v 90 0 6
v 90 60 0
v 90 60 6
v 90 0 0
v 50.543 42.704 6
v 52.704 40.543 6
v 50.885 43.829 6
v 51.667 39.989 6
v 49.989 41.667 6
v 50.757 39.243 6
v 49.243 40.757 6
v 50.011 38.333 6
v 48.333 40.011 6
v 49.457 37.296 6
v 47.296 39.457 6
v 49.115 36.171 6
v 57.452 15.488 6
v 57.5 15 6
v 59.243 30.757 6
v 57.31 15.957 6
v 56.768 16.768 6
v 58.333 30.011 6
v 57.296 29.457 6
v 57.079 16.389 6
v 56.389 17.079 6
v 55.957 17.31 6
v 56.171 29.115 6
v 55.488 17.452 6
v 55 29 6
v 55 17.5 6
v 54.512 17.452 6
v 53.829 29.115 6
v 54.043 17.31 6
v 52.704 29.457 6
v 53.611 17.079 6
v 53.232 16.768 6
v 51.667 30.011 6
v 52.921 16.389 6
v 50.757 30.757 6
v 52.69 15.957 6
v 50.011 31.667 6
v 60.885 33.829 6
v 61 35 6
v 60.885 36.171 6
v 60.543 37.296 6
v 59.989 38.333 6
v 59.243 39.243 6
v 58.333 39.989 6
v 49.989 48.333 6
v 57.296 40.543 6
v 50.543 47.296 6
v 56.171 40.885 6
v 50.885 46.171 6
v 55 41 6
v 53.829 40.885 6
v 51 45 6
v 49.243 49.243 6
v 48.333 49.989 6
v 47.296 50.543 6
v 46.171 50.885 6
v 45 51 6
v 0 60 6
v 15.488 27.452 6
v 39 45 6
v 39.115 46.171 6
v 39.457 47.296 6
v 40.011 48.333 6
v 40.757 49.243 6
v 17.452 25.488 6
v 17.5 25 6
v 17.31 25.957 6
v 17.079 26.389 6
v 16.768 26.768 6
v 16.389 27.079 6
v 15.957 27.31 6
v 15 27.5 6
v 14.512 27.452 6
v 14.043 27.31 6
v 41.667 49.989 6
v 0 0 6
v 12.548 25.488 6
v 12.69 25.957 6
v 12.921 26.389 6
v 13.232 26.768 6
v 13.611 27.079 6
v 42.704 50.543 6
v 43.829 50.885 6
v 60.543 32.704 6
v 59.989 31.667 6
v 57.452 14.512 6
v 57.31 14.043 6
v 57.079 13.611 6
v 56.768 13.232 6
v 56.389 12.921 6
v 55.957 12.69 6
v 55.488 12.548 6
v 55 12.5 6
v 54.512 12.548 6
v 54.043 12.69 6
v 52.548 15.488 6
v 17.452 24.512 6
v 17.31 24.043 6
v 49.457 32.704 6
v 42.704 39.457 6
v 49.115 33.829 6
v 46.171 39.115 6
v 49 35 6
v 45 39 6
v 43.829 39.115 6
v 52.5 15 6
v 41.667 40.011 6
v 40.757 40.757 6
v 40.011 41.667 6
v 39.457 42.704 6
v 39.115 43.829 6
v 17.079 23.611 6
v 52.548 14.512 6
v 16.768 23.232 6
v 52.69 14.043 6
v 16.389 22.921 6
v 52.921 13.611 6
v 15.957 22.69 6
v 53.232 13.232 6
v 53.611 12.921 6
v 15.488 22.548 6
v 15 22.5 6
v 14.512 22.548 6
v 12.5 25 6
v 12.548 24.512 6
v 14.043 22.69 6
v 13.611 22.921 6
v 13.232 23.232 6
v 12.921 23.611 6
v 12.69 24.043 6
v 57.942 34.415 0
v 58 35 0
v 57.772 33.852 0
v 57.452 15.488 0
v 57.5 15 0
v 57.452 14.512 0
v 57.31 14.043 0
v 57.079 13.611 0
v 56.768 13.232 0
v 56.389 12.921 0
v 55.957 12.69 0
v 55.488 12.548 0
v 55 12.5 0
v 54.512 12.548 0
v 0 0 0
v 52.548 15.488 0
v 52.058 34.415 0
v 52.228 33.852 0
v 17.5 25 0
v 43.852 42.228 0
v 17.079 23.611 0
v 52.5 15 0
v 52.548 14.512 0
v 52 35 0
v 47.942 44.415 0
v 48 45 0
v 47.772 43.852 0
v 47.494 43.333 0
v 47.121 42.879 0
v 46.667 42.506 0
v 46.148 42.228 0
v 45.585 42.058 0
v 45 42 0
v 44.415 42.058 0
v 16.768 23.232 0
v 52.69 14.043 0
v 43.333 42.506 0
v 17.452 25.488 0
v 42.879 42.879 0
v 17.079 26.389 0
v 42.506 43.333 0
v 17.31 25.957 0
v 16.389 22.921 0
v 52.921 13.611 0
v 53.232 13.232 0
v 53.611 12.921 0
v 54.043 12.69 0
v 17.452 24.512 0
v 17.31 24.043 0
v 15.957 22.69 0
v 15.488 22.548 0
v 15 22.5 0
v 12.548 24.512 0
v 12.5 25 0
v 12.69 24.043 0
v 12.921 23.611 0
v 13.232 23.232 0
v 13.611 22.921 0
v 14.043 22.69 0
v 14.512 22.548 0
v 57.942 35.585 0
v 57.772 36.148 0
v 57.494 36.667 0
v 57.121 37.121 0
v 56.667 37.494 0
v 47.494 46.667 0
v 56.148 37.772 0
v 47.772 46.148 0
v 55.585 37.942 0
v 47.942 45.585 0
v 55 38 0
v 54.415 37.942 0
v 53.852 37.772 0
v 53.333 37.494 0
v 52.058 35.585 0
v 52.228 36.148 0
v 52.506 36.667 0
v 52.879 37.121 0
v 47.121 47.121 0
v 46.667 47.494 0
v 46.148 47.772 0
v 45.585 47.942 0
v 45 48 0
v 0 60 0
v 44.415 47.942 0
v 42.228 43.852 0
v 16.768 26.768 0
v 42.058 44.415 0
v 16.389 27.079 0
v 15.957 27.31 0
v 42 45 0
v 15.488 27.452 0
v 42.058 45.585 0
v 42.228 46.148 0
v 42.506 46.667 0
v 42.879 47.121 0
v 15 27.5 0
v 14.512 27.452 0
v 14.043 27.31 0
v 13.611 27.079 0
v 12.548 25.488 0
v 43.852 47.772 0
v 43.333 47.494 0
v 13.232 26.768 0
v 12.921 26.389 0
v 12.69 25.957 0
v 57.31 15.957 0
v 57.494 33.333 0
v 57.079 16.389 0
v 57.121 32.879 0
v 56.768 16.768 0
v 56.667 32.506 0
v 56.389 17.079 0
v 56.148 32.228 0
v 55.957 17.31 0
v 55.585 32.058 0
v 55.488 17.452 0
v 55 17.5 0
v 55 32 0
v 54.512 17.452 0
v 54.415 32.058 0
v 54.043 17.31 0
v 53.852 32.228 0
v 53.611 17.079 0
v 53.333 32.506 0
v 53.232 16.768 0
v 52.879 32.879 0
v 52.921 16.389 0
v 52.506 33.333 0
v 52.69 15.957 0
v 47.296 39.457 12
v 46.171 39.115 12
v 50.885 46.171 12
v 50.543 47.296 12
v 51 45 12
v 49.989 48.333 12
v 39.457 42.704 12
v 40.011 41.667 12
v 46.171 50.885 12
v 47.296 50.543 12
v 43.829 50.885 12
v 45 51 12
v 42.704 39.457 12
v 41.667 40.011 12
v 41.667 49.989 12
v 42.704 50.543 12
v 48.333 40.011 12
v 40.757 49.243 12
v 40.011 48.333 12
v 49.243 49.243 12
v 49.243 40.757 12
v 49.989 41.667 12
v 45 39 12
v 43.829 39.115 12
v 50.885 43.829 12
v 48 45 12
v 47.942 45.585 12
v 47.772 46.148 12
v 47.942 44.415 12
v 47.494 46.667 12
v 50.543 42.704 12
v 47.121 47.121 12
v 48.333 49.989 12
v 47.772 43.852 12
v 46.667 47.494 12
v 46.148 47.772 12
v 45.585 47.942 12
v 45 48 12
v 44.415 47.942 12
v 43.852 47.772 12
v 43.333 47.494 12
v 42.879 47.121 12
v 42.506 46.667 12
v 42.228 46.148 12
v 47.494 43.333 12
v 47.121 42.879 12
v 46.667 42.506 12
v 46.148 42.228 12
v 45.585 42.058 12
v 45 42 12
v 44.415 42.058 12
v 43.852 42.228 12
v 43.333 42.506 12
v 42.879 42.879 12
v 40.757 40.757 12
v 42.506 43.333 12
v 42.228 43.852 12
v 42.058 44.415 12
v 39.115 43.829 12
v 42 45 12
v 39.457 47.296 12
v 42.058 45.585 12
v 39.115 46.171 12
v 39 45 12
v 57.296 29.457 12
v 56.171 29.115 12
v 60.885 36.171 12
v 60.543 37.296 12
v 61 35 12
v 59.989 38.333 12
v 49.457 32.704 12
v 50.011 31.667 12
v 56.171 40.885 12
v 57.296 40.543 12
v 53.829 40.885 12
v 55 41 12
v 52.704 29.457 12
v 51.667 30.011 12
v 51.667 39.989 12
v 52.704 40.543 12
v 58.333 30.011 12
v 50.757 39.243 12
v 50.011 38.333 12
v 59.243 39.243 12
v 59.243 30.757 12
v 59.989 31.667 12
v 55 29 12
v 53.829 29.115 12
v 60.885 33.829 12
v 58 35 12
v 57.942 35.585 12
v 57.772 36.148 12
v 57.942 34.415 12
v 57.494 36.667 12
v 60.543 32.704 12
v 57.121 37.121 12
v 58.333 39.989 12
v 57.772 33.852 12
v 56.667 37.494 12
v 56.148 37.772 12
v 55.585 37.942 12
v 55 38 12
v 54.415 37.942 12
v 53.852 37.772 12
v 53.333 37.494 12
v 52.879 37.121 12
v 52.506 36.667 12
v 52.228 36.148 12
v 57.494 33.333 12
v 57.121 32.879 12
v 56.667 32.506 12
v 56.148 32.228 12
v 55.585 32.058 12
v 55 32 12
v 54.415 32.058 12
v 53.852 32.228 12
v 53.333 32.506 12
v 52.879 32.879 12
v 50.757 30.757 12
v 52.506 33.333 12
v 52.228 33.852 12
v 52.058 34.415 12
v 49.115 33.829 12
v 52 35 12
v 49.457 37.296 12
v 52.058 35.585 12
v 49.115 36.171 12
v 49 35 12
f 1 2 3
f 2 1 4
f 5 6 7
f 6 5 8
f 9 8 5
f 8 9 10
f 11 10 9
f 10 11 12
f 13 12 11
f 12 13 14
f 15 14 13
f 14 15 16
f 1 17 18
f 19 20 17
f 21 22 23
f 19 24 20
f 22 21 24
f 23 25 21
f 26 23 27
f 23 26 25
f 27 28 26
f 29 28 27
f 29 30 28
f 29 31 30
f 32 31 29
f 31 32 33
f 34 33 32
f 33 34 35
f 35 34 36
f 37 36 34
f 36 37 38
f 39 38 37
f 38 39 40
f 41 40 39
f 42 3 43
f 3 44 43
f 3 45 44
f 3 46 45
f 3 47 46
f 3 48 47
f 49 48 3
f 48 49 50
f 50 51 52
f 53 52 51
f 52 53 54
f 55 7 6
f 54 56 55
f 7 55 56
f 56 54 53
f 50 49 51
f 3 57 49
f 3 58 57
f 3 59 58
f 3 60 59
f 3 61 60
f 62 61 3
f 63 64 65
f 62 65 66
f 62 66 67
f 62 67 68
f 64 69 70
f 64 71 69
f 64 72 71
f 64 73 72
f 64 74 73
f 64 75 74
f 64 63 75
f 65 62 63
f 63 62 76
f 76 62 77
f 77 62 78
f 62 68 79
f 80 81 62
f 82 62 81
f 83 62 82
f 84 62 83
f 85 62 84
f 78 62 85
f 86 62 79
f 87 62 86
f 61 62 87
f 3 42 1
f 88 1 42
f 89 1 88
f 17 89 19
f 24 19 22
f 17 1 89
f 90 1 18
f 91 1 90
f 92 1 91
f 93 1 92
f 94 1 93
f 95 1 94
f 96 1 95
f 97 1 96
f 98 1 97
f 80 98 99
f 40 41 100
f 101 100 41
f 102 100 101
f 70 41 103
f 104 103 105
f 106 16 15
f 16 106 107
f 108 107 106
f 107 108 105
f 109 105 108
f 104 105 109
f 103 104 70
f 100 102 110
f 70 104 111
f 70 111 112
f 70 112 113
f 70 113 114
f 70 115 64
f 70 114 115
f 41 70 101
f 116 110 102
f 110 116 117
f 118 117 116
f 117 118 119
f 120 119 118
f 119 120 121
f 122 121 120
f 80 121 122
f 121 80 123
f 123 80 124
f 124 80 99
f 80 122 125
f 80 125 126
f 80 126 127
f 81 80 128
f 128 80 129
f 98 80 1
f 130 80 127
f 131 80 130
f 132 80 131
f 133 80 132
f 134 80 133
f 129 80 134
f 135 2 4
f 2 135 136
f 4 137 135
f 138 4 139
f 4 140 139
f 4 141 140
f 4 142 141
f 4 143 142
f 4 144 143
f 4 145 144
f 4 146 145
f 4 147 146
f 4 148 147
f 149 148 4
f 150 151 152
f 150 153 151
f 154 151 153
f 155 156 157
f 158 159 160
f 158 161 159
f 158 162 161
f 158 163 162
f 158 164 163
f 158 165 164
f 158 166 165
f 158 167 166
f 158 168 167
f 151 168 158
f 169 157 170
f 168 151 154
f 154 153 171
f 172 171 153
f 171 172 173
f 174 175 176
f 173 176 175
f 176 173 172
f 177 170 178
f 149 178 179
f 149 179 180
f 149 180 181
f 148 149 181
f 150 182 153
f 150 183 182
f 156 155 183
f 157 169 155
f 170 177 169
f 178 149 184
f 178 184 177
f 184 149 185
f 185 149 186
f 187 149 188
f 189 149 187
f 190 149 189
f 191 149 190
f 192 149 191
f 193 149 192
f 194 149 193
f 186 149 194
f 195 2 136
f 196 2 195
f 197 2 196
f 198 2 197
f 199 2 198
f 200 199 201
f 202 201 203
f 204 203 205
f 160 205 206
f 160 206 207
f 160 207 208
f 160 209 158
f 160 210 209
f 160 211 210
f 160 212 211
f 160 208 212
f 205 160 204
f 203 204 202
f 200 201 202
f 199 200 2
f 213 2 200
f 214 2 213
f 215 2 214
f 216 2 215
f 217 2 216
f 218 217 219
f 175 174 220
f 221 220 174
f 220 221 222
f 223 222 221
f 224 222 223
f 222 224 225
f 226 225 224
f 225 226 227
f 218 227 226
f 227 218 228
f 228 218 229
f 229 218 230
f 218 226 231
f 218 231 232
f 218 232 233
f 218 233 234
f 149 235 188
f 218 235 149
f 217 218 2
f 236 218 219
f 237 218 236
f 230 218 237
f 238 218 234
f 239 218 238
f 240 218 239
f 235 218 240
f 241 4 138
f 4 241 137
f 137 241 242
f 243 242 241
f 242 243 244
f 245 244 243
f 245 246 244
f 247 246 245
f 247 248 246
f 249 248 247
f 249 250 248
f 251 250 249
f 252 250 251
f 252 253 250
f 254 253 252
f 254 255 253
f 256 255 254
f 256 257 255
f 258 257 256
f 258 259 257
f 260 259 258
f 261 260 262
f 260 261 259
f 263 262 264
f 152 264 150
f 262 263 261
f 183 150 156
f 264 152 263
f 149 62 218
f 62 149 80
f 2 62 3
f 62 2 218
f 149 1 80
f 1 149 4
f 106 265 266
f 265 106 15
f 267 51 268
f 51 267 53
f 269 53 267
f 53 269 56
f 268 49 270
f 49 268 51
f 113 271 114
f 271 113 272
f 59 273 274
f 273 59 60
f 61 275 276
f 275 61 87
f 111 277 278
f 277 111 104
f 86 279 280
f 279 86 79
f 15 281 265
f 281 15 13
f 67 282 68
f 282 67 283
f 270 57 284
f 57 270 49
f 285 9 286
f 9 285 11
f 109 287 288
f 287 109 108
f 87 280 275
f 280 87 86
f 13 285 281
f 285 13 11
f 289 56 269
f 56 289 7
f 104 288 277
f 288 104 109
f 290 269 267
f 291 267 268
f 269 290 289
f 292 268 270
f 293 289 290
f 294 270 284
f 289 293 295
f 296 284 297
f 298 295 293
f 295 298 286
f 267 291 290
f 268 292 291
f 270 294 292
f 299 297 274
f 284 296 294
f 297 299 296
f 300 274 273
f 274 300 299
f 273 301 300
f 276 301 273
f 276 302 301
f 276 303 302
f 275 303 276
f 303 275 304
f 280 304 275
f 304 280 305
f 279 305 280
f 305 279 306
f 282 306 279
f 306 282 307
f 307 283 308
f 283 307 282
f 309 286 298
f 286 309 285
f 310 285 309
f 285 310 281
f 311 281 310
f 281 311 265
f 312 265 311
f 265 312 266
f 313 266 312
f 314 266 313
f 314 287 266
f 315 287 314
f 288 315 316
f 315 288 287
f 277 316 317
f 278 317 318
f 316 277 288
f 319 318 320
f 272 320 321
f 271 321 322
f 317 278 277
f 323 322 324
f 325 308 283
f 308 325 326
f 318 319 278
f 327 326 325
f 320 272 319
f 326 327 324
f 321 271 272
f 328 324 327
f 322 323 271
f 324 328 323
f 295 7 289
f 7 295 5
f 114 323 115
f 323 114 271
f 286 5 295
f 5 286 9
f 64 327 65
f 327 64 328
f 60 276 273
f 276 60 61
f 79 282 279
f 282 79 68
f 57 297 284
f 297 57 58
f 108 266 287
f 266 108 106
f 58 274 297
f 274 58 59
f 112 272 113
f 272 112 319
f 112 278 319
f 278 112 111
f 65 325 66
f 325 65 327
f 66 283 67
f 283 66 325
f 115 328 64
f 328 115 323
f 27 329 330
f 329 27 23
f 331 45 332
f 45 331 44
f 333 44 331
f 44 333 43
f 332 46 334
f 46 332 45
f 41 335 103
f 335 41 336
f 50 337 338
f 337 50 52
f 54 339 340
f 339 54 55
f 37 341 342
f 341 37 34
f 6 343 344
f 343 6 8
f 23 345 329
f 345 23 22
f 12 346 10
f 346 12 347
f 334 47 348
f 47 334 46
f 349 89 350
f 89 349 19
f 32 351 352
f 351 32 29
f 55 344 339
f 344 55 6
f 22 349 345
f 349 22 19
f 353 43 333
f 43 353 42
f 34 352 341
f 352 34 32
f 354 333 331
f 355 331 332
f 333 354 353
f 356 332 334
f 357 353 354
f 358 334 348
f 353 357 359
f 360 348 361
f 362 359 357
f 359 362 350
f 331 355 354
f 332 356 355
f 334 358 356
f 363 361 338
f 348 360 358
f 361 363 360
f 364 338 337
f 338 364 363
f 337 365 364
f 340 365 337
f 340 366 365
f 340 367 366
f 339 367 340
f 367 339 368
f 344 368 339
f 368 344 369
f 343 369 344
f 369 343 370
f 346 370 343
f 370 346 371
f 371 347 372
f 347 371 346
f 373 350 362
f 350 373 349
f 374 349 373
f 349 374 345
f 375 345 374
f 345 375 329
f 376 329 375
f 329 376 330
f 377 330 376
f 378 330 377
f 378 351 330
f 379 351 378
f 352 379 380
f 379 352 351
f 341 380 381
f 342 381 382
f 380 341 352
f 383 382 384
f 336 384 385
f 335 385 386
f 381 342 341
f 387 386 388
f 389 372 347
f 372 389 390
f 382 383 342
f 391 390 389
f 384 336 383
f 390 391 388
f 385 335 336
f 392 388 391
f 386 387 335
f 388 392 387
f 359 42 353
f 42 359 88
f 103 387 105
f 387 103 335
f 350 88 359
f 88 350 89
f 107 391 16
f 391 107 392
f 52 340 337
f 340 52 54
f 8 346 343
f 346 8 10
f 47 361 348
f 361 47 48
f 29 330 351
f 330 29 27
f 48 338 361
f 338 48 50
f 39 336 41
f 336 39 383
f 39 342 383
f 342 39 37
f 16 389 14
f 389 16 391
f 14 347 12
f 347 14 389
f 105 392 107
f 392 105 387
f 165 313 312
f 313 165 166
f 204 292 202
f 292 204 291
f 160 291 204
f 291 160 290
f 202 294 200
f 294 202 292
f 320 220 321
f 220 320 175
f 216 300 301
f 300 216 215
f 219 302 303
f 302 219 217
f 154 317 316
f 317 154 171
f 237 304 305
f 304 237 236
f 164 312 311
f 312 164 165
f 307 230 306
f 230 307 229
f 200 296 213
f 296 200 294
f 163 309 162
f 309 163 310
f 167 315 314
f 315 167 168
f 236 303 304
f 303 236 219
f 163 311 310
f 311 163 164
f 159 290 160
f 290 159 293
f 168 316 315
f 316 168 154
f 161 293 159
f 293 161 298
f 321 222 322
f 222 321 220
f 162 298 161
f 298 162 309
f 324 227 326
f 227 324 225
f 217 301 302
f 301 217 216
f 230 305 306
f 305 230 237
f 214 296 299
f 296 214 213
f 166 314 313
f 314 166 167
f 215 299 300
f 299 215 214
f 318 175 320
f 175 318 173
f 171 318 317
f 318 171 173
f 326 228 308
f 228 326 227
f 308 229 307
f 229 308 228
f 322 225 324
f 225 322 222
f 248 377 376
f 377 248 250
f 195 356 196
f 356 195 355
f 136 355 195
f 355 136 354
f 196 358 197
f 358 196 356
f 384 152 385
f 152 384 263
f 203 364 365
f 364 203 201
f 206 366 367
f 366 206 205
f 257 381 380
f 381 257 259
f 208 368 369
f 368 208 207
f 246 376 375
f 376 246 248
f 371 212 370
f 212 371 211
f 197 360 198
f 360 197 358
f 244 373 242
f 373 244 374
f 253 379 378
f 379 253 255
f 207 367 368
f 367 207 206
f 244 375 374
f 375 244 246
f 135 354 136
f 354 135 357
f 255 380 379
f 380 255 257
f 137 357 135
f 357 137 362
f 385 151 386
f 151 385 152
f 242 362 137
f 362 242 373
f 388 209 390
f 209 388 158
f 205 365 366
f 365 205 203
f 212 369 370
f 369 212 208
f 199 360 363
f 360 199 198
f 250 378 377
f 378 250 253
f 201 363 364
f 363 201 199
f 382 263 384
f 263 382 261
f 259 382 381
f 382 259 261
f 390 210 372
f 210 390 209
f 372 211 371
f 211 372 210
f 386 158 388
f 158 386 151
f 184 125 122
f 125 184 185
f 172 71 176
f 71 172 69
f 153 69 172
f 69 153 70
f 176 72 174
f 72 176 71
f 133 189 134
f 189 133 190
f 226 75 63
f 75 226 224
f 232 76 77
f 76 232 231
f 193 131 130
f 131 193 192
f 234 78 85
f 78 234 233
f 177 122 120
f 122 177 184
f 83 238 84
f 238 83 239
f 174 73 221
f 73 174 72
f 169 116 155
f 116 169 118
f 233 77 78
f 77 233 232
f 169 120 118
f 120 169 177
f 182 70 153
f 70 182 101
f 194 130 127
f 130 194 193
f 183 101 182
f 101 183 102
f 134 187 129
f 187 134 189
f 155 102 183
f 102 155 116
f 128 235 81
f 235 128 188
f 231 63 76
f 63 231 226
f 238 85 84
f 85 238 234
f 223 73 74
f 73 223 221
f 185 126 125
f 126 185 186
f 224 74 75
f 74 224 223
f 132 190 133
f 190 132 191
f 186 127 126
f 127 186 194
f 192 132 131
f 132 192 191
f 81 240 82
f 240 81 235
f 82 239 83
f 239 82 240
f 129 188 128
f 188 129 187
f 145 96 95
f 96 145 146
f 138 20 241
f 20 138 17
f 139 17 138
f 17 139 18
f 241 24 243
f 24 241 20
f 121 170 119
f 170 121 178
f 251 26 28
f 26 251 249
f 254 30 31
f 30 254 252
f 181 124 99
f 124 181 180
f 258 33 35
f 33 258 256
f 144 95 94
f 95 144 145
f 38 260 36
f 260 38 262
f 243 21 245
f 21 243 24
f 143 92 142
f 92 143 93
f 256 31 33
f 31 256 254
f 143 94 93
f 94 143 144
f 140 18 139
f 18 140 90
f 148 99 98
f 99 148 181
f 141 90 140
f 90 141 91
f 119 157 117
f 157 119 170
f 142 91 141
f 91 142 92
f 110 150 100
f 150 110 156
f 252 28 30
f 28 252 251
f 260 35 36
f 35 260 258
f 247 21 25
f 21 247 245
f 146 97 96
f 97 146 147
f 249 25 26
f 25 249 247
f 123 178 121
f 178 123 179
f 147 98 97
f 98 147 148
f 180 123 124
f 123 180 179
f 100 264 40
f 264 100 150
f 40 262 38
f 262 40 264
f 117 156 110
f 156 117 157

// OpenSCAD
$fn = 32;

// ----------------------------------------------------------------------
// Mixed field: bosses and holes at given coordinates
// ----------------------------------------------------------------------

// --- parameters (mm) ---
plate_l = 90;             // plate length, X
plate_w = 60;             // plate width, Y
plate_t = 6;              // plate thickness, Z
boss_d = 12;              // boss diameter
boss_h = 6;               // boss height above the plate
hole_d = 5;               // through hole diameter

total_h = plate_t + boss_h;  // overall height

difference() {
  union() {
    cube([plate_l, plate_w, plate_t]);
    translate([45, 45, plate_t]) cylinder(h = boss_h, d = boss_d);
    translate([55, 35, plate_t]) cylinder(h = boss_h, d = boss_d);
  }
  translate([45, 45, -1]) cylinder(h = total_h + 2, d = boss_d / 2);
  translate([55, 35, -1]) cylinder(h = total_h + 2, d = boss_d / 2);
  translate([15, 25, -1]) cylinder(h = plate_t + 2, d = hole_d);
  translate([55, 15, -1]) cylinder(h = plate_t + 2, d = hole_d);
}
